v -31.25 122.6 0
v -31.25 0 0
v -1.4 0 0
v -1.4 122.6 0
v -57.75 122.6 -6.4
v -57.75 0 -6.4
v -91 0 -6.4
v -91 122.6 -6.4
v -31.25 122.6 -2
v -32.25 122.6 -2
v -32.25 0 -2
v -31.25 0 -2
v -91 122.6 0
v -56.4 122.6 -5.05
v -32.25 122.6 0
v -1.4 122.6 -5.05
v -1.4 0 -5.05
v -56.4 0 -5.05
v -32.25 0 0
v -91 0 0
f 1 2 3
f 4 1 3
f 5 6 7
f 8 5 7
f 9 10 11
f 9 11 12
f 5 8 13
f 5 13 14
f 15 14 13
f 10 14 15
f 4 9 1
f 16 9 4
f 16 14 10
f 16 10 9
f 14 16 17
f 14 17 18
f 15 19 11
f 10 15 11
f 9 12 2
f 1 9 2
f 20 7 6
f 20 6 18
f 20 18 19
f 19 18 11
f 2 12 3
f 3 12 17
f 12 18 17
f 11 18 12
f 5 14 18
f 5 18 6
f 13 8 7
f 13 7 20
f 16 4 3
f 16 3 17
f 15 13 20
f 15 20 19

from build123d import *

# Parameters (mm, degrees)
BOSS_EXTRUDE1_DEPTH     = 122.6
SKETCH2_W               = 52.856609426
SKETCH2_H               = 136.885065439
CUT_EXTRUDE1_DEPTH      = 1.4
CUT_EXTRUDE2_DEPTH      = 1
CUT_EXTRUDE2_DEPTH_BACK = 123.6


with BuildPart() as part:
    # Sketch1 → Boss-Extrude1 (new body)
    with BuildSketch(Plane(origin=(0, 0, 0), x_dir=(1, 0, 0), z_dir=(0, 1, 0))):
        Polygon((-4.75, 15), (-4.75, 5.05), (-14.75, 5.05), (-14.75, 6.4), (-91, 6.4), (-91, 0), (-32.25, 0), (-32.25, 2), (-31.25, 2), (-31.25, 0), (0, 0), (0, 15), align=None)
    extrude(amount=BOSS_EXTRUDE1_DEPTH)

    # Sketch2 → Cut-Extrude1 (cut)
    with BuildSketch(Plane(origin=(0, 0, 0), x_dir=(0, 0, -1), z_dir=(1, 0, 0))):
        with Locations((4.111755806, 55.794103185)):
            Rectangle(SKETCH2_W, SKETCH2_H)
    extrude(amount=-CUT_EXTRUDE1_DEPTH, mode=Mode.SUBTRACT)

    # Sketch3 → Cut-Extrude2 (cut, two sides)
    with BuildSketch(Plane(origin=(0, 122.6, 0), x_dir=(1, 0, 0), z_dir=(0, 1, 0))) as cut_extrude2_sk:
        Polygon((-1.4, 5.05), (-56.4, 5.05), (-60.82107113, 9.47107113), (-60.82107113, 21.013712959), (-1.4, 21.013712959), align=None)
    extrude(amount=CUT_EXTRUDE2_DEPTH, mode=Mode.SUBTRACT)
    extrude(cut_extrude2_sk.sketch, amount=-CUT_EXTRUDE2_DEPTH_BACK, mode=Mode.SUBTRACT)


solid = part.part
